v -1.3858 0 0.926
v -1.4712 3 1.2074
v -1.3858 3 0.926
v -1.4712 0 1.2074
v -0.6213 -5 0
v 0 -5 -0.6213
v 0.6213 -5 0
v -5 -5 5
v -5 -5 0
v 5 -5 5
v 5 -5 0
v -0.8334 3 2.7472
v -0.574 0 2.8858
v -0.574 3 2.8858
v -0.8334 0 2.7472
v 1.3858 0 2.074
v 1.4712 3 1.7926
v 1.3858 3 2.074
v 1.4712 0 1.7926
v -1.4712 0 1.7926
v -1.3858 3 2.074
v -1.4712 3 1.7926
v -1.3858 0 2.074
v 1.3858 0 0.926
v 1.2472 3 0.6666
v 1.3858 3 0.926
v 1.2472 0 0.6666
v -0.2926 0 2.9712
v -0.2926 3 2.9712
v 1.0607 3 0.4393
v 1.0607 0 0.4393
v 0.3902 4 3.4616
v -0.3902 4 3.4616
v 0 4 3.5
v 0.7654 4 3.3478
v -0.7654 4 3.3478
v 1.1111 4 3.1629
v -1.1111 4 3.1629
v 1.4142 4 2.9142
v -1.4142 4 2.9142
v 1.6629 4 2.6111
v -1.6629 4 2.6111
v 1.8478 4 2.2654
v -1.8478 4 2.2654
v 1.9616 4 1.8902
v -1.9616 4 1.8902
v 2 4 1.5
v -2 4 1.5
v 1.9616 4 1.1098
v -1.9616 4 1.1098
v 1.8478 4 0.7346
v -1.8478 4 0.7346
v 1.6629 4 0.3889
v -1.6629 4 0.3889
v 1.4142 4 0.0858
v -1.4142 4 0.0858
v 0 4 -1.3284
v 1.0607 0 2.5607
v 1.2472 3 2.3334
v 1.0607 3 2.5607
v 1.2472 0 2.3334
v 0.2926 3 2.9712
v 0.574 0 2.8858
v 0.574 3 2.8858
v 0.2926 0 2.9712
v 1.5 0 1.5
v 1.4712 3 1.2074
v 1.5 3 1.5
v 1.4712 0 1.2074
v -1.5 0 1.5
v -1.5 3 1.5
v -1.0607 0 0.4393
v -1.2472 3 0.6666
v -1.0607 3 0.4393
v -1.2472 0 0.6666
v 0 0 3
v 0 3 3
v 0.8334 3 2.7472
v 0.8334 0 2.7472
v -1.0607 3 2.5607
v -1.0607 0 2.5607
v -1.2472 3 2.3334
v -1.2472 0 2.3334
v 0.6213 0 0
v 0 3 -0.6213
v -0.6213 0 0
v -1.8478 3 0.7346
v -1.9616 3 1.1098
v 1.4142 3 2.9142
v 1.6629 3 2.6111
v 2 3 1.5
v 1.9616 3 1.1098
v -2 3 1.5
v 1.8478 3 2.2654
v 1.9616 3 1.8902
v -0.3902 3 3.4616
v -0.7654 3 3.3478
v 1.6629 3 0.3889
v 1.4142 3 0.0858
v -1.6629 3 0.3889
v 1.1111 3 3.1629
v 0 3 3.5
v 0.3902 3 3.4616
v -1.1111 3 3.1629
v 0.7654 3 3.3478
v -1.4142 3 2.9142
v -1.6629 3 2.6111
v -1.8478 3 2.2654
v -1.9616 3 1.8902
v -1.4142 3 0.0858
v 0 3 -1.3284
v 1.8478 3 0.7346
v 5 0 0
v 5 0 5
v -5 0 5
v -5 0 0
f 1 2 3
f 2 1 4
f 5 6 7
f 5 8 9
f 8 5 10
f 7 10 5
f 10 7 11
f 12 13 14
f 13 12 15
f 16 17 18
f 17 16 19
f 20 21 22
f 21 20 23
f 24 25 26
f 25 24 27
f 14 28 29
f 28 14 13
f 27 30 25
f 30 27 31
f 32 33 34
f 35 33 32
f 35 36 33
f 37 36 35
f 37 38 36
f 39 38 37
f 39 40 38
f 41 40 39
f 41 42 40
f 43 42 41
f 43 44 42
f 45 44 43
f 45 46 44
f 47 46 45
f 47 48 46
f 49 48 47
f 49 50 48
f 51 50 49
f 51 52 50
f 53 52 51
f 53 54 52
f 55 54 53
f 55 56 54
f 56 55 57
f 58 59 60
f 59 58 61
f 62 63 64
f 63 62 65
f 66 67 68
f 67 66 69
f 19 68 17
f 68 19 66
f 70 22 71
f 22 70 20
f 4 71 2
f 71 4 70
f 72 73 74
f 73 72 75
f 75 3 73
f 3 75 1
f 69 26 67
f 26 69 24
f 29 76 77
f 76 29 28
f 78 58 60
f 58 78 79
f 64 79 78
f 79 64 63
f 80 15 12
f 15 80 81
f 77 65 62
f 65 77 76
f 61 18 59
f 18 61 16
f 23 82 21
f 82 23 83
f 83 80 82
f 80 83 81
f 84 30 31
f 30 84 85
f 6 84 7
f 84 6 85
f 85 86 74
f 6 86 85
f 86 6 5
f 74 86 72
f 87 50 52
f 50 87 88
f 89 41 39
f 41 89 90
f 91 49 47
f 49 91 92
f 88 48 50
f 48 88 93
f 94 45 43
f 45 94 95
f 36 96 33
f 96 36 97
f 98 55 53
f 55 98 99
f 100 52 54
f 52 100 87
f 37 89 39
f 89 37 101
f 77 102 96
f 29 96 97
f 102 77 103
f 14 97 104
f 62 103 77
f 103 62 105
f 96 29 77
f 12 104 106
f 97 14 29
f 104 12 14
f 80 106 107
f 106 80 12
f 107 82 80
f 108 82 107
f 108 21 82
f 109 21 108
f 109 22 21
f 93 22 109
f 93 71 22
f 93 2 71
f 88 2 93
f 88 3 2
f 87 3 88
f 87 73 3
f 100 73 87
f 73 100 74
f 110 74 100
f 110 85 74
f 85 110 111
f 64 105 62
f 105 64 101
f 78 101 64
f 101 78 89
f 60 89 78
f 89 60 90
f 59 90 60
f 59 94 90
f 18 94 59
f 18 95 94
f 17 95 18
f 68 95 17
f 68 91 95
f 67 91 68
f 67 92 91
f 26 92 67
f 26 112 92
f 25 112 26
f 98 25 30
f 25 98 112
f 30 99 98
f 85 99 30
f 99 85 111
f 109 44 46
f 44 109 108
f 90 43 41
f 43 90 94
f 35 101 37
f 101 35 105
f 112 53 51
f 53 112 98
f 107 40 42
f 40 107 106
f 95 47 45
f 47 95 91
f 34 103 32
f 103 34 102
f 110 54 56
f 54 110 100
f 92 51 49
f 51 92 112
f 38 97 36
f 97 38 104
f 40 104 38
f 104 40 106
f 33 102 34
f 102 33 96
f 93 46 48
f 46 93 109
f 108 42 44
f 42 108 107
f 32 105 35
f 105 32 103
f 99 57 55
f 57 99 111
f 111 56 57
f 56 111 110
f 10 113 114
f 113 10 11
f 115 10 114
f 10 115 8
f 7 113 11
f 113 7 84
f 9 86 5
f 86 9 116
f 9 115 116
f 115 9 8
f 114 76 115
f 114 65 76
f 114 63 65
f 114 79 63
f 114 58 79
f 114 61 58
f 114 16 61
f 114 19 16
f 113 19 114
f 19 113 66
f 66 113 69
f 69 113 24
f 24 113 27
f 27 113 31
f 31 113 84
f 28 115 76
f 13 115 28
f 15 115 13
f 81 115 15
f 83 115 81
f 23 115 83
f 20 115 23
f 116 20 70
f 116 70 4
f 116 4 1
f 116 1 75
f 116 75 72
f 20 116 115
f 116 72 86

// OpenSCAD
// Socket Mask

render_part=1; // socket_mask()

module socket_mask(peg_d=3.0,rim_d=4.0,peg_min_l=3.0,body_h=5,body_w=10.0,body_l=5.0) {
  $fn=32;
  union() {
    rotate([-90,0,0]) union() {
     rotate([0,0,45]) union() {
      translate([-peg_d/2/sqrt(2),-peg_d/2/sqrt(2),-body_l]) union() {
        cylinder(r=peg_d/2,h=body_l+peg_min_l+rim_d-peg_d,center=false);
        cube(size=[peg_d/2,peg_d/2,body_l+peg_min_l+rim_d-peg_d],center=false);
      }
      translate([-peg_d/2/sqrt(2),-peg_d/2/sqrt(2),peg_min_l]) union() {
        cylinder(r=rim_d/2,h=rim_d-peg_d,center=false);
        cube(size=[rim_d/2,rim_d/2,rim_d-peg_d],center=false);
      }
     }
    }
    translate([-body_w/2,-body_l,0]) cube(size=[body_w,body_l,body_h],center=false);
  }
}

if(render_part==1) {
  echo("Rendering socket_mask()...");
  socket_mask();
}
